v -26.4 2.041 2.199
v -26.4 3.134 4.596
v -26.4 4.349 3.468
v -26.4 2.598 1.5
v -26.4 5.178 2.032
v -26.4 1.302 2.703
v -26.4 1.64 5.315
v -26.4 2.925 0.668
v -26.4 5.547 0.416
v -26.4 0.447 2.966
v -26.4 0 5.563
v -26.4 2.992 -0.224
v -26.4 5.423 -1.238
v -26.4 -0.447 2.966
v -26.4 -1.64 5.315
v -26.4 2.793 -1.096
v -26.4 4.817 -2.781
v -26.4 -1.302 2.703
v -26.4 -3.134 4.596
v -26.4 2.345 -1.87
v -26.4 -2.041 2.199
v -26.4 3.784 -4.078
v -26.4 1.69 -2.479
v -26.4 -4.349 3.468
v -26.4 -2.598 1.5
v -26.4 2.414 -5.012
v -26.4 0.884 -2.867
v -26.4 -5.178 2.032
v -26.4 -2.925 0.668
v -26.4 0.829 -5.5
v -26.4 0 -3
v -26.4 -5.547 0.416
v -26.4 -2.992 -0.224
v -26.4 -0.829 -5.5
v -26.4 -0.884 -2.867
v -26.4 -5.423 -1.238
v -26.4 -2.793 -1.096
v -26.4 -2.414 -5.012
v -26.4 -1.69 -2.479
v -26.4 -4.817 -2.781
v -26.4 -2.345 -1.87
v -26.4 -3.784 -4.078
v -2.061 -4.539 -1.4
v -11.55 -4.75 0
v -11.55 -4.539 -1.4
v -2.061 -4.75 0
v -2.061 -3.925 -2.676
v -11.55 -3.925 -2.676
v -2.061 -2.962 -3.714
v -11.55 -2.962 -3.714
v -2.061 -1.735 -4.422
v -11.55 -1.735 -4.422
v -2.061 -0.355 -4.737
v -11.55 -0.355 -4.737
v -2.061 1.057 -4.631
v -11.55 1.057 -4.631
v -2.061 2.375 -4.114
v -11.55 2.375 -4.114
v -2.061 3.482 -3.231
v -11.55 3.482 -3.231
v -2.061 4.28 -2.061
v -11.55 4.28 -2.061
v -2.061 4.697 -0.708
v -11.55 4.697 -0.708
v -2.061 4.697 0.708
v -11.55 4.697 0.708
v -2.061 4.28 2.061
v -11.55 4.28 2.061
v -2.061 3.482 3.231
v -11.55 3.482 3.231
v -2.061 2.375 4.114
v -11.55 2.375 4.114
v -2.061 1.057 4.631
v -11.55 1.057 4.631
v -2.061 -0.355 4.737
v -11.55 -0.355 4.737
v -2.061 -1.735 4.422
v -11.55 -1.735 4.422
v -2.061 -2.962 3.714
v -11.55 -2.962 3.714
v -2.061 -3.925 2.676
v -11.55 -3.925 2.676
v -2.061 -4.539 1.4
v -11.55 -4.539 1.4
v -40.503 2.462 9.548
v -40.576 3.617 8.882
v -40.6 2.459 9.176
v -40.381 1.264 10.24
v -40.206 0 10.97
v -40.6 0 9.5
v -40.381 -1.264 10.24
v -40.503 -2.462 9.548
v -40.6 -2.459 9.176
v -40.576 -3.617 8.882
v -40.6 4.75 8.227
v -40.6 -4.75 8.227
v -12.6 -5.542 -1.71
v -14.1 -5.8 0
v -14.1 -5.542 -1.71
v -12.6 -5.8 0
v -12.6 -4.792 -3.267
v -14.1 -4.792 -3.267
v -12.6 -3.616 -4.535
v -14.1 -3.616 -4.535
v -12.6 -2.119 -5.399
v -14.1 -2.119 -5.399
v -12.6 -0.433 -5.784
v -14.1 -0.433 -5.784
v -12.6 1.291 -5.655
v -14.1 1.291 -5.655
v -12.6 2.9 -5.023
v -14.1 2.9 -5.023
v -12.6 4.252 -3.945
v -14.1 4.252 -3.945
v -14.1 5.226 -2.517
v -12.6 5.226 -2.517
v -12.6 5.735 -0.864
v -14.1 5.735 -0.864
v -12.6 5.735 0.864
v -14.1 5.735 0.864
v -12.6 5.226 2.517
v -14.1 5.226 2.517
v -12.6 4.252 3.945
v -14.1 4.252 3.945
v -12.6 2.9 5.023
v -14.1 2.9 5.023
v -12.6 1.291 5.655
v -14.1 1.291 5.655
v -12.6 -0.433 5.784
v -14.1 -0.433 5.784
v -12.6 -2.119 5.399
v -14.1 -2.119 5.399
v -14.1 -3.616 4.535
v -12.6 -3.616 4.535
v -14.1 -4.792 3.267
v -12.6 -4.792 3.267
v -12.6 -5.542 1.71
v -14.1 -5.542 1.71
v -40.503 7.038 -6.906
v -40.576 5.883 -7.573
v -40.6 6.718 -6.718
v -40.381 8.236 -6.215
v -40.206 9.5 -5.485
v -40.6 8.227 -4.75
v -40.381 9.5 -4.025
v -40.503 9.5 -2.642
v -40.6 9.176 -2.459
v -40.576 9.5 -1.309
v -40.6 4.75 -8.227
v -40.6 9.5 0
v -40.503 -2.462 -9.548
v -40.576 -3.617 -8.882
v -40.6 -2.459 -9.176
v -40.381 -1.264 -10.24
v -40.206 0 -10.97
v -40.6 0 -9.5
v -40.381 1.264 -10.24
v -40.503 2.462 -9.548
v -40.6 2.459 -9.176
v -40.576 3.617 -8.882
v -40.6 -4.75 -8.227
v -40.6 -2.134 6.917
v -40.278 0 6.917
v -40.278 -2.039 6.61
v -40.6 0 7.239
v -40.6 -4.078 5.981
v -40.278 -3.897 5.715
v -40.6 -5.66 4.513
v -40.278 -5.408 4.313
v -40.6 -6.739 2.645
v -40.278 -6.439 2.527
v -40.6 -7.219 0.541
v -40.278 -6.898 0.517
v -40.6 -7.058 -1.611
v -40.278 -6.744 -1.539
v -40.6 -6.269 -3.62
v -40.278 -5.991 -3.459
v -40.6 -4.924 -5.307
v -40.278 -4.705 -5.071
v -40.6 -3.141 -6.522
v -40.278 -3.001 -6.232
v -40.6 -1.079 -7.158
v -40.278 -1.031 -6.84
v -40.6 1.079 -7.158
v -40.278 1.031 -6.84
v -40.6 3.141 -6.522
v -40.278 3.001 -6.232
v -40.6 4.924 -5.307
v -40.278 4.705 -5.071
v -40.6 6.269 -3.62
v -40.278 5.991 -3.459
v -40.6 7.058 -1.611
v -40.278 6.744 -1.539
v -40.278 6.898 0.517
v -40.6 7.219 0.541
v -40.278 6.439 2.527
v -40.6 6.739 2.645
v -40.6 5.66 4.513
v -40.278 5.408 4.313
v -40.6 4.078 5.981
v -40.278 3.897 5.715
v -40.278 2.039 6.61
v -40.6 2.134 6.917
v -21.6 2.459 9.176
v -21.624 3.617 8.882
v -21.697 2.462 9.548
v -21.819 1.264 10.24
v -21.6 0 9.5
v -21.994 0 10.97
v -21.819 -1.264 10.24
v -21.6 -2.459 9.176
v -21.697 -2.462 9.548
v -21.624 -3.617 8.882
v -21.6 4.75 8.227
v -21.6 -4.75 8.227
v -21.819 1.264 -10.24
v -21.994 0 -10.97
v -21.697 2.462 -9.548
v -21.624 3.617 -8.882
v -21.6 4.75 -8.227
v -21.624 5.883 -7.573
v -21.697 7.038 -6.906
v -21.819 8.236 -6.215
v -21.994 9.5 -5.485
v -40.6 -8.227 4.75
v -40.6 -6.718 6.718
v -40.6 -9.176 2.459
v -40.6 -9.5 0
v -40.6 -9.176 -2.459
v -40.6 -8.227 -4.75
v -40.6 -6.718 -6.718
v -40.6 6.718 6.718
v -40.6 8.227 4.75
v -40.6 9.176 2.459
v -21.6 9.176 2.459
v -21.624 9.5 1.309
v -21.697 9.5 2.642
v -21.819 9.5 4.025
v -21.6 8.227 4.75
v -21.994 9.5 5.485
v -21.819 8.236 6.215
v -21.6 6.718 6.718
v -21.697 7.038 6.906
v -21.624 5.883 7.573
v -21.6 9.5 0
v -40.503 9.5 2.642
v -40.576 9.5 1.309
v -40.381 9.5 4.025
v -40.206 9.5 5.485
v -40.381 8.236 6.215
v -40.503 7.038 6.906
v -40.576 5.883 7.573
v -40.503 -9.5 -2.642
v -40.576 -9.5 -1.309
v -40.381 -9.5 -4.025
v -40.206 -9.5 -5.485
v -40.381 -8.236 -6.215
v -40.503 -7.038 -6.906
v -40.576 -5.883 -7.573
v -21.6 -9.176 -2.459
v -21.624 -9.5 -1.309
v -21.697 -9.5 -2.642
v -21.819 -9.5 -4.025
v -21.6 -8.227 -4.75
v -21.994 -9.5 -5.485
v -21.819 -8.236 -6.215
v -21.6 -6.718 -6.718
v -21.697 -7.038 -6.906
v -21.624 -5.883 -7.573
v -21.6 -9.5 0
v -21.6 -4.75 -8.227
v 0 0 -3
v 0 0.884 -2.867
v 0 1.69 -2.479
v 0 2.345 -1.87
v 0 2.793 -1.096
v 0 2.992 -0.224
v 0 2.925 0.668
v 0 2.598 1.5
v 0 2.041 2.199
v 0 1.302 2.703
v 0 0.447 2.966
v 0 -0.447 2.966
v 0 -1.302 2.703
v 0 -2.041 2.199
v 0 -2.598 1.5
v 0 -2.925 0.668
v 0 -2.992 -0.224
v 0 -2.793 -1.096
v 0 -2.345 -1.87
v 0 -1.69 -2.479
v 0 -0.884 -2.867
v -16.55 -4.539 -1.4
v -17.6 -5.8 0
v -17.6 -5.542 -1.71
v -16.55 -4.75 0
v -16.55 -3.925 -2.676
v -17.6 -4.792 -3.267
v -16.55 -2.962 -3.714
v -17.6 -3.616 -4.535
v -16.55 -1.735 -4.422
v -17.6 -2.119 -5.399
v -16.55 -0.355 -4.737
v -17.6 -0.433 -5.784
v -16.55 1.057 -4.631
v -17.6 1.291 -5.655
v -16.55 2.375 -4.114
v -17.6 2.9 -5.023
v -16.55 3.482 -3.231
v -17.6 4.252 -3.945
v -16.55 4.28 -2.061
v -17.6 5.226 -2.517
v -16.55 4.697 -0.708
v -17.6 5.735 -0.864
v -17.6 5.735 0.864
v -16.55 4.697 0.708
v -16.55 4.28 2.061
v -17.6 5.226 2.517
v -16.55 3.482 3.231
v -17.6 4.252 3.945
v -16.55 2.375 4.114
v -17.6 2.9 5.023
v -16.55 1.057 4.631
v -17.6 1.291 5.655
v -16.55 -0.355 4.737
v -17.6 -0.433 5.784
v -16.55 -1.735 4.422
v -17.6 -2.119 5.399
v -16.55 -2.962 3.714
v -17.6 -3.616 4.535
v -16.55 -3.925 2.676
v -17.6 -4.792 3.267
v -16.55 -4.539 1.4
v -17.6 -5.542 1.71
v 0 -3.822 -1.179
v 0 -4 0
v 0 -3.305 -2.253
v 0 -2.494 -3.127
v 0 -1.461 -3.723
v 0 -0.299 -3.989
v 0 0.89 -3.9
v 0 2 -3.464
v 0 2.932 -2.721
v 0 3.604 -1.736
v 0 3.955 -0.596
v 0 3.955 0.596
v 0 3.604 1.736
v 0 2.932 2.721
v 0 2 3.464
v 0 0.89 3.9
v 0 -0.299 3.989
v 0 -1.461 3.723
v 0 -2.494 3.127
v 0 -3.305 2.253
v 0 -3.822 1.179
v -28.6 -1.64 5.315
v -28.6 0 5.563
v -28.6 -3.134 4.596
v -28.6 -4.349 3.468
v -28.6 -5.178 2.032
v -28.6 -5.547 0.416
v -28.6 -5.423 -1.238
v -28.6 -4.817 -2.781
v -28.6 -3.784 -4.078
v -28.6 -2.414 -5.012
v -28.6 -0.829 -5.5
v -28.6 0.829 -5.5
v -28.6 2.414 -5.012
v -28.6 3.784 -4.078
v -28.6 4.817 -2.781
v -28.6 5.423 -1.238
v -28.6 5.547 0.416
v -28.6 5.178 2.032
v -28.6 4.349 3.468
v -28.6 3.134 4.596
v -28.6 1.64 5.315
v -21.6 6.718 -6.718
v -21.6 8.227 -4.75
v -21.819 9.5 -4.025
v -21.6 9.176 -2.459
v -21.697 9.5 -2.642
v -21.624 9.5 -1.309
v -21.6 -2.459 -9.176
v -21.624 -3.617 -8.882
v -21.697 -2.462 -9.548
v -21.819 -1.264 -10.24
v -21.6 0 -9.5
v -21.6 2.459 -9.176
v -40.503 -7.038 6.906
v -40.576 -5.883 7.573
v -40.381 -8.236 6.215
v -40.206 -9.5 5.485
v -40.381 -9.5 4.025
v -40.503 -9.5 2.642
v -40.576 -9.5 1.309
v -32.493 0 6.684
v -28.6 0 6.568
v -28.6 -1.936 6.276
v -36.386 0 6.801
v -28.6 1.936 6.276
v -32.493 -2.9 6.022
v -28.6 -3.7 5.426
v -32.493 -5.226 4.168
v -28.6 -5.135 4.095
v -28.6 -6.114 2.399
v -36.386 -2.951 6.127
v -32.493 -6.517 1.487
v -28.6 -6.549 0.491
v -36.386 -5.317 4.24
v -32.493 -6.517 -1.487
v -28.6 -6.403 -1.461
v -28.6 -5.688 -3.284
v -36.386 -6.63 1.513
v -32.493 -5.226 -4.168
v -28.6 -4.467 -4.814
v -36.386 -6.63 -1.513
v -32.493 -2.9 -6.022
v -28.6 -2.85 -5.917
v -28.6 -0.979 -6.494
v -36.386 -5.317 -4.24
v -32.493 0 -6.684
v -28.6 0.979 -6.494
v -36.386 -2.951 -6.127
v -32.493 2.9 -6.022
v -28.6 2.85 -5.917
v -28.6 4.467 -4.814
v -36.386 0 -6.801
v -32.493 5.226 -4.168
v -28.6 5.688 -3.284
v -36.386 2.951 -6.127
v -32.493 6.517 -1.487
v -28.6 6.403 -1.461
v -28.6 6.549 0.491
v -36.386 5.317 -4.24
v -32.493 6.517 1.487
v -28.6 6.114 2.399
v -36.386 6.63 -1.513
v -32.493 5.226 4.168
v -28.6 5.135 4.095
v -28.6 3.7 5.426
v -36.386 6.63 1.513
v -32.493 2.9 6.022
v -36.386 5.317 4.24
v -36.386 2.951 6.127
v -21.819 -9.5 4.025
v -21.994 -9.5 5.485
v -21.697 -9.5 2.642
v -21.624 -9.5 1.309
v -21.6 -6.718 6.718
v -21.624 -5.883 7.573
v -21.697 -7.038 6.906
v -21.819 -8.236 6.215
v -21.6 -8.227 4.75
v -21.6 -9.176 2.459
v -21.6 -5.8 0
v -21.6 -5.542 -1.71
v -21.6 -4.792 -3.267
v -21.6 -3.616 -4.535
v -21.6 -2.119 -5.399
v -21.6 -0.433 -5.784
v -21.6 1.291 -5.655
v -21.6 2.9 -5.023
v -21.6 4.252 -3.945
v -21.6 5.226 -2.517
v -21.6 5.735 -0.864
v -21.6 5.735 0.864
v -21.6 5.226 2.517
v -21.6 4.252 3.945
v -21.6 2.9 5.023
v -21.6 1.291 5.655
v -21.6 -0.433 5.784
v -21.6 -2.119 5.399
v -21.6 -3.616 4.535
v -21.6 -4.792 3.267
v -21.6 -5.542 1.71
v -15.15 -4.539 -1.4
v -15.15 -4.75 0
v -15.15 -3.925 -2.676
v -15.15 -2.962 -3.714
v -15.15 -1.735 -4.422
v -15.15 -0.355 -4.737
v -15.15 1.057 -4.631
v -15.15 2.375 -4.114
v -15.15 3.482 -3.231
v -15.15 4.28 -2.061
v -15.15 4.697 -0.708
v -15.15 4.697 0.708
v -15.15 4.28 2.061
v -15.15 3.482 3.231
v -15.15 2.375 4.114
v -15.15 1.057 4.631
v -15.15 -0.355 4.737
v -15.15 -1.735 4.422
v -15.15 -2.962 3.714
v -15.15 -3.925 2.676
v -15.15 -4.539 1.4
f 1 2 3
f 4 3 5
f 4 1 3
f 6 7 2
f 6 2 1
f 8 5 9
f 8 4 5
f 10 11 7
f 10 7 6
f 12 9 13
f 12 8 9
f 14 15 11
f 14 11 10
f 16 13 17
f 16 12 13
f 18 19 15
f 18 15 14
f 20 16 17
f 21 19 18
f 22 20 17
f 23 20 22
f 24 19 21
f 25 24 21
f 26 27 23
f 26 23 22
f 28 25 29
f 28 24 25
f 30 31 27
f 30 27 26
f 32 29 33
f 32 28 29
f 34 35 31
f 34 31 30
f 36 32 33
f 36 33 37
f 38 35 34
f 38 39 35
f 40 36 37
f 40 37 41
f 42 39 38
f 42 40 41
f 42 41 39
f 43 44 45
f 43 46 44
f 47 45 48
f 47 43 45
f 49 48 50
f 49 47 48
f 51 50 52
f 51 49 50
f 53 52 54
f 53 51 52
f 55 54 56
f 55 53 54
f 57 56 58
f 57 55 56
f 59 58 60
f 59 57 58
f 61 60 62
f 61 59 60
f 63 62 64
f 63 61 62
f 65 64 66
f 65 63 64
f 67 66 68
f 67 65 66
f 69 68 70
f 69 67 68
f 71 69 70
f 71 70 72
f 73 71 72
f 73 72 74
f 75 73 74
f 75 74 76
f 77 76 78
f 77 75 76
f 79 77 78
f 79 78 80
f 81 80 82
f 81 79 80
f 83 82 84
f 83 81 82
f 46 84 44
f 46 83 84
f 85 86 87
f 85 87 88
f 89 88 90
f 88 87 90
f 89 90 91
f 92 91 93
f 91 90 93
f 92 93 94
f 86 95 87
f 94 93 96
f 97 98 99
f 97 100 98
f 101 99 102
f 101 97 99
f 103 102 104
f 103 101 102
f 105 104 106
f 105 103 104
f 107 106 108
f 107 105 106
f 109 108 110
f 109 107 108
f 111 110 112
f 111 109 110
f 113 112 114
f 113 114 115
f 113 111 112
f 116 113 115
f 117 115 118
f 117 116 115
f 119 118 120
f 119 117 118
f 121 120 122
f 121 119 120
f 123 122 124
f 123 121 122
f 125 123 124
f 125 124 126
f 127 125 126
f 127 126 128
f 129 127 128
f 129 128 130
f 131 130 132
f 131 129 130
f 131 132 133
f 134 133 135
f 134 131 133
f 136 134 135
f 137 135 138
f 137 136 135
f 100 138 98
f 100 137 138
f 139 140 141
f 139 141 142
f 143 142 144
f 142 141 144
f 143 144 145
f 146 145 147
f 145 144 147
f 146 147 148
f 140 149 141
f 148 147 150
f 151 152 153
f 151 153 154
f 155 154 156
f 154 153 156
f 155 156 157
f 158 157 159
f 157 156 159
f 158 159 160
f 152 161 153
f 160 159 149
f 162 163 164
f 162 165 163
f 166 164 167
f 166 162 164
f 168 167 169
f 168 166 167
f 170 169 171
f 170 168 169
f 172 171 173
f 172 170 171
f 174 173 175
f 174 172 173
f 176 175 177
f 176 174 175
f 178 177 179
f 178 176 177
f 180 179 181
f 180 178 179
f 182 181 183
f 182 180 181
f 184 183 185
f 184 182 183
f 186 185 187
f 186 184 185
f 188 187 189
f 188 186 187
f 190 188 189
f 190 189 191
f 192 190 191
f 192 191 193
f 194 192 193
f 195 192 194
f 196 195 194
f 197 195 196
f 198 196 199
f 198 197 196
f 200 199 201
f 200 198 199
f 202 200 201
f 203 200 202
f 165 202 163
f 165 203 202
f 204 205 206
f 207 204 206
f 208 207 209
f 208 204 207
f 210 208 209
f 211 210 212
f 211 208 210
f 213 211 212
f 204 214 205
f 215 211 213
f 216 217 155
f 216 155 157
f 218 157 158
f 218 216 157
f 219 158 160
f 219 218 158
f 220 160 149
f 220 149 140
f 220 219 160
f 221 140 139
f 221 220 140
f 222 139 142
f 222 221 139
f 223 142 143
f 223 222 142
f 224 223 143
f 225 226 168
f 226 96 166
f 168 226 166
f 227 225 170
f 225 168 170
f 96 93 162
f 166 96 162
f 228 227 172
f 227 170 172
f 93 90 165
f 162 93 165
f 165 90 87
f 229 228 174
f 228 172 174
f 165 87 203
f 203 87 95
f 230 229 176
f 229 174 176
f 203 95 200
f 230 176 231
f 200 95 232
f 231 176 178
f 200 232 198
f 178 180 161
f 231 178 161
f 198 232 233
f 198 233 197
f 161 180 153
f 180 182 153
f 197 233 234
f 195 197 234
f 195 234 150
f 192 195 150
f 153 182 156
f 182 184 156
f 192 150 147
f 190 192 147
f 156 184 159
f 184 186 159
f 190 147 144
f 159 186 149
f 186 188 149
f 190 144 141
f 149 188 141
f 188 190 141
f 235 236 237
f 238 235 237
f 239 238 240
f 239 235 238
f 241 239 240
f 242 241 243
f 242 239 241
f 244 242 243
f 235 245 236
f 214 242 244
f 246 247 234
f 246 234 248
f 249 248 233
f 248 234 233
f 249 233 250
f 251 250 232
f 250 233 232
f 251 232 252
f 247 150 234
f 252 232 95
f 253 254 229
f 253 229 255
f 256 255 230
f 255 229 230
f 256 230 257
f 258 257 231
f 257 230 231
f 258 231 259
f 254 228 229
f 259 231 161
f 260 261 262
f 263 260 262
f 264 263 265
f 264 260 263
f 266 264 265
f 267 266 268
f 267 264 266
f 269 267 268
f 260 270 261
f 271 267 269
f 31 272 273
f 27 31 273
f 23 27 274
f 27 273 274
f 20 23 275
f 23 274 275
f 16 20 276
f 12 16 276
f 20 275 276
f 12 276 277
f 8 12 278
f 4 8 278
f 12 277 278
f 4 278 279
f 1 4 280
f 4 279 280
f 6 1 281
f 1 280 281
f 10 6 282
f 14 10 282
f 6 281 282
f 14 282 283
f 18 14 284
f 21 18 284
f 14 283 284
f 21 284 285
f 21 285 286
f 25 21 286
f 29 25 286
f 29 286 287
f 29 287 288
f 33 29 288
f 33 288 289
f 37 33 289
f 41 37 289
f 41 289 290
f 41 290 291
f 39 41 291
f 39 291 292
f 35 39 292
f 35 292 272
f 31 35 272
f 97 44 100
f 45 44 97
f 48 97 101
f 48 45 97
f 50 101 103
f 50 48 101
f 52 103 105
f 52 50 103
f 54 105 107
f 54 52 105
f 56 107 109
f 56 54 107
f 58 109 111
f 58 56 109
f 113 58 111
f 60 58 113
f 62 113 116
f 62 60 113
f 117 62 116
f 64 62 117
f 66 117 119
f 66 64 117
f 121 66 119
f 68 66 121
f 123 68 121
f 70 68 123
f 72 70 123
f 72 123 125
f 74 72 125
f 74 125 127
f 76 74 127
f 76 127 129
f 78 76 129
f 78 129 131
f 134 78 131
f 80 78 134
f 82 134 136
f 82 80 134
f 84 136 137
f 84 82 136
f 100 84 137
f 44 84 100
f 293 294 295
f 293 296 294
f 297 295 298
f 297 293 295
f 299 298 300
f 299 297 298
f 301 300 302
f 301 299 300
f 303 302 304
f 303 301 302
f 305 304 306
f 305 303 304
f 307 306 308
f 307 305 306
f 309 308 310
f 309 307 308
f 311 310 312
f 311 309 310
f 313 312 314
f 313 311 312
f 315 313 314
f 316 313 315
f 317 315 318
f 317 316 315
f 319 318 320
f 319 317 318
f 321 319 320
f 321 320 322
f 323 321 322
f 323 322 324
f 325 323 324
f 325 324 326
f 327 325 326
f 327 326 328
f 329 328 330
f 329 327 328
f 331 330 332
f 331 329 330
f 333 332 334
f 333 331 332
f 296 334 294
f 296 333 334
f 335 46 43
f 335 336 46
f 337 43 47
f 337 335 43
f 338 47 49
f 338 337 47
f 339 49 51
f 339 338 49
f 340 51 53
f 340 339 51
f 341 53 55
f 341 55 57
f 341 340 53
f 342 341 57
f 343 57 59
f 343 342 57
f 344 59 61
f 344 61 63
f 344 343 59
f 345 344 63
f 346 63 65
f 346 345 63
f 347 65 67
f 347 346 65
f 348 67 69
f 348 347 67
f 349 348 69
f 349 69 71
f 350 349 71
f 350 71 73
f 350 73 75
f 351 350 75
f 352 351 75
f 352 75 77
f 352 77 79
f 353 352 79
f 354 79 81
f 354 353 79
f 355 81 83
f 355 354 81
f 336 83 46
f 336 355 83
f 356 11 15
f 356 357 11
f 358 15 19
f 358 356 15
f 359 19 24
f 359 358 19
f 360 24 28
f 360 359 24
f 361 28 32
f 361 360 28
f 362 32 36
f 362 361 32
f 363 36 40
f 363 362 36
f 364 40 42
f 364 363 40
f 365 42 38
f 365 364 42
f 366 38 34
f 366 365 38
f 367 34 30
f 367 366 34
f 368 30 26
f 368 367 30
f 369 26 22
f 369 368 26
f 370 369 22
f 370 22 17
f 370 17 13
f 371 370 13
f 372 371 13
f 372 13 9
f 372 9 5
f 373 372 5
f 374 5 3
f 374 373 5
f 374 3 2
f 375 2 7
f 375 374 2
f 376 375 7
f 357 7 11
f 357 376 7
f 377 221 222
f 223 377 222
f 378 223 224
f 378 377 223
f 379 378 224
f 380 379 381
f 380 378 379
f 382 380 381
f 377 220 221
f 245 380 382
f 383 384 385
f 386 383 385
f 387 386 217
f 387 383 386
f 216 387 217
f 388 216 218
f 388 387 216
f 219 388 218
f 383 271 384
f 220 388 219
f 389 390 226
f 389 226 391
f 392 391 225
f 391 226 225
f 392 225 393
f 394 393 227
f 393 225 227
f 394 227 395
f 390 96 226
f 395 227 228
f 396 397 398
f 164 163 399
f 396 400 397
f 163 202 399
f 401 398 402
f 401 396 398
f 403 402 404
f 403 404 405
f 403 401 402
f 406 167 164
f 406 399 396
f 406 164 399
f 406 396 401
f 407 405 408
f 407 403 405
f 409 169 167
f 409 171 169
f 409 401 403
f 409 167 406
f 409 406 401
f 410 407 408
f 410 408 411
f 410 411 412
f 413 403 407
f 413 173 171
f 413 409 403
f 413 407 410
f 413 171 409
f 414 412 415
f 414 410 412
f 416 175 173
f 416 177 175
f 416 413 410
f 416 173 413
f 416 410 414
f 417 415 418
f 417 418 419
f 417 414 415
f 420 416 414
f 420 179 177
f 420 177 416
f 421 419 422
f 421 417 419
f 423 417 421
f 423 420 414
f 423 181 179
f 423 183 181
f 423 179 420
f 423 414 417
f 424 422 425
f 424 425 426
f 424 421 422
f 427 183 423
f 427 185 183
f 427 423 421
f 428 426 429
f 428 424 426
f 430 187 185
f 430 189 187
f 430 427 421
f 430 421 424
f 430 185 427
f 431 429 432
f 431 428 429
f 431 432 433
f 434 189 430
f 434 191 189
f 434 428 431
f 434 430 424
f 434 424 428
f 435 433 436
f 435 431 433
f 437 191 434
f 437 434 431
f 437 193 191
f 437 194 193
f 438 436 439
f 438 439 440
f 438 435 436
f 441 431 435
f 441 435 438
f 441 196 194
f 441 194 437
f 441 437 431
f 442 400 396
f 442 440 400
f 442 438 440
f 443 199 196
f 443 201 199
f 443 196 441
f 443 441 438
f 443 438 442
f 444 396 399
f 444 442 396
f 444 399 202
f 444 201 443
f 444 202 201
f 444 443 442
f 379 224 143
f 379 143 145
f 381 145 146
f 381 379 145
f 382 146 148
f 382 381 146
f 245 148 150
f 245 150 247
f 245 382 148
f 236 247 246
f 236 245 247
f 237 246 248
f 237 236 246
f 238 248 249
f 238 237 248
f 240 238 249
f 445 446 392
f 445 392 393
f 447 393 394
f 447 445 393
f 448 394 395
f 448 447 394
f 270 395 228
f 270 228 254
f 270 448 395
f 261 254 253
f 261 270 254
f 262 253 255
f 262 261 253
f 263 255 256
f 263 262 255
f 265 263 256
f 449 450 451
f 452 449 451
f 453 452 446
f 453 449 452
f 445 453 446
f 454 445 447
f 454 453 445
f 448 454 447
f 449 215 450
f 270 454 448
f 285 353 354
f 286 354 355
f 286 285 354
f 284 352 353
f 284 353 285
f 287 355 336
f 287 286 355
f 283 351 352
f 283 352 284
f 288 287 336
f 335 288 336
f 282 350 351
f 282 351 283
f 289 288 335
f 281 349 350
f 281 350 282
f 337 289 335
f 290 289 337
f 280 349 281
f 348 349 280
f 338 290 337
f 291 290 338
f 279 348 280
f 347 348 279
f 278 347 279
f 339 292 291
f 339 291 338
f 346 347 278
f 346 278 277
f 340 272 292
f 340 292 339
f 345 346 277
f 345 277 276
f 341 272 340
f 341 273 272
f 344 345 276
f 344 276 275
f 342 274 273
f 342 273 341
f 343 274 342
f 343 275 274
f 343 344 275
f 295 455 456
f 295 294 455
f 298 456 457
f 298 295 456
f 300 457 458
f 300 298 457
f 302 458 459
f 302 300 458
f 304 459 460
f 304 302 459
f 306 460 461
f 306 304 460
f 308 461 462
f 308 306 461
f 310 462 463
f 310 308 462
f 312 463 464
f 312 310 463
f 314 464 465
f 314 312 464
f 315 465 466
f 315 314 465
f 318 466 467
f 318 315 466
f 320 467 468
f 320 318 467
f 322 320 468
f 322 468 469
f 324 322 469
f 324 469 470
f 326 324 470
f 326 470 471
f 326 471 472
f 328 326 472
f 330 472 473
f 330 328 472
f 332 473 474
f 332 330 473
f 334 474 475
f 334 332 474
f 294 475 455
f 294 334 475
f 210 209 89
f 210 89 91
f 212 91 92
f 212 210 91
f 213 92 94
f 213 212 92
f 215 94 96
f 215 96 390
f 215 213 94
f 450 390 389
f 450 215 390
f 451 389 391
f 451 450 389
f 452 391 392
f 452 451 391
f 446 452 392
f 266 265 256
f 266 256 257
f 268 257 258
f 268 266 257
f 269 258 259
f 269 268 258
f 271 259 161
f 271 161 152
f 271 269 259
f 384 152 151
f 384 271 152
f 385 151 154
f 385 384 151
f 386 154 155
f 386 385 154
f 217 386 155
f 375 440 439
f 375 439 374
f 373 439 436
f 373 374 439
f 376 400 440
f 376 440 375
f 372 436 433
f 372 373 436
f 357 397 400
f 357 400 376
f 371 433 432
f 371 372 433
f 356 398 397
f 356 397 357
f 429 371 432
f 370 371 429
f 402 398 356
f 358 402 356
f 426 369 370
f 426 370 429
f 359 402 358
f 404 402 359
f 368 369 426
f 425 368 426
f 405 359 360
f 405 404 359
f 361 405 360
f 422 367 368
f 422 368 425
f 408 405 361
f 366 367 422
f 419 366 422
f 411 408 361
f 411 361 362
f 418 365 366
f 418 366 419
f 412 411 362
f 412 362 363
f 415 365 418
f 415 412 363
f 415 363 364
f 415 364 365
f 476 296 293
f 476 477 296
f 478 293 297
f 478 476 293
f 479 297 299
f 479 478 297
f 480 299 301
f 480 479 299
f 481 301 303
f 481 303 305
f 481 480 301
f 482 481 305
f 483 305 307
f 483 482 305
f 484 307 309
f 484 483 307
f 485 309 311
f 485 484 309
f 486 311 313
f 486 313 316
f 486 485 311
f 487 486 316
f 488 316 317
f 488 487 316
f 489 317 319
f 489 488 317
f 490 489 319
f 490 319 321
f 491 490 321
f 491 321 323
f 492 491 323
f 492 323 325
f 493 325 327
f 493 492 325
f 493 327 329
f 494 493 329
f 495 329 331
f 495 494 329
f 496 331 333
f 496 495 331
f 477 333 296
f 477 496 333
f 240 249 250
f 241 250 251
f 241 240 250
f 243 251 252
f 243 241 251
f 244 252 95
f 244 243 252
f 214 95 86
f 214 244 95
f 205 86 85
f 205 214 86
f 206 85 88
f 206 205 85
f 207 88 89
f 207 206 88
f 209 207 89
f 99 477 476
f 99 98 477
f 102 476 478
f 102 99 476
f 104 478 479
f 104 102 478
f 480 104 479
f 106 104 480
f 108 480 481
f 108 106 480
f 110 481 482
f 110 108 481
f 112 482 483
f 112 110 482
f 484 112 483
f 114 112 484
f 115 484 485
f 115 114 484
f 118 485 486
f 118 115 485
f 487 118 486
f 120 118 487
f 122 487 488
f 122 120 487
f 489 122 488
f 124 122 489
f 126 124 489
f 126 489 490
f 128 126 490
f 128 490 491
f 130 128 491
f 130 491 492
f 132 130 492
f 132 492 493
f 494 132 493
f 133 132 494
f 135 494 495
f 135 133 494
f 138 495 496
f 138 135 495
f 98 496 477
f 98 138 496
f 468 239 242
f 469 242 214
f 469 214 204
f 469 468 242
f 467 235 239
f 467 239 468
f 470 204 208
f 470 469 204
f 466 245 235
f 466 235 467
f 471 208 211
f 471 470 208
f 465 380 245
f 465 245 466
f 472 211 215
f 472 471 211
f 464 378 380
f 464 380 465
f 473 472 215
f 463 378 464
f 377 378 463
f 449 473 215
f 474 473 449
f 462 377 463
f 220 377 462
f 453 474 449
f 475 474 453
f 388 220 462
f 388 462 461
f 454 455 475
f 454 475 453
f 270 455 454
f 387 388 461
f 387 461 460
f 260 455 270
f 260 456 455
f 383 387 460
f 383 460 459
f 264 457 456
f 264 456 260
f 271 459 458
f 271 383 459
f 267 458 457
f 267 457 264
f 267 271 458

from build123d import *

# Parameters (mm, degrees)
SKETCH2_R           = 3
BOSS_EXTRUDE1_DEPTH = 40.6


with BuildPart() as part:
    # Sketch2 → Boss-Extrude1 (new body)
    with BuildSketch(Plane(origin=(0, 0, 0), x_dir=(0, 0, -1), z_dir=(1, 0, 0))):
        Polygon((10.969655115, 0), (5.484827557, 9.5), (-5.484827557, 9.5), (-10.969655115, 0), (-5.484827557, -9.5), (5.484827557, -9.5), align=None)
        Circle(SKETCH2_R, mode=Mode.SUBTRACT)
    extrude(amount=-BOSS_EXTRUDE1_DEPTH)

    # Sketch3 → Cut-Revolve1 (revolve, cut)
    with BuildSketch(Plane.XY, mode=Mode.PRIVATE) as cut_revolve1_sk:
        Polygon((-21.6, 9.5), (-21.6, 5.8), (-17.6, 5.8), (-16.55, 4.75), (-15.15, 4.75), (-14.1, 5.8), (-12.6, 5.8), (-11.55, 4.75), (-2.060608065, 4.75), (0, 4), (0, 12), (-22.269872981, 12), align=None)
        Polygon((-40.6, 9.5), (-40.6, 13), (-39.662177826, 13), align=None)
    revolve(cut_revolve1_sk.sketch.rotate(Axis((-40.6, 0, 0), (1, 0, 0)), 180), axis=Axis((-40.6, 0, 0), (1, 0, 0)), mode=Mode.SUBTRACT)

    # Sketch6 → 1/4 NPT Tapped Hole1 (revolve, cut)
    with BuildSketch(Plane(origin=(-40.6, 0, 0), x_dir=(0, 0, 1), z_dir=(0, 1, 0))):
        Polygon((0, 0), (0, 14.2), (5.5626, 14.2), (5.5626, 12), (6.56760783, 12), (6.9172709, 0.3217291), (7.239, 0), align=None)
    revolve(axis=Axis((-46.95, 0, 0), (1, 0, 0)), mode=Mode.SUBTRACT)


solid = part.part
